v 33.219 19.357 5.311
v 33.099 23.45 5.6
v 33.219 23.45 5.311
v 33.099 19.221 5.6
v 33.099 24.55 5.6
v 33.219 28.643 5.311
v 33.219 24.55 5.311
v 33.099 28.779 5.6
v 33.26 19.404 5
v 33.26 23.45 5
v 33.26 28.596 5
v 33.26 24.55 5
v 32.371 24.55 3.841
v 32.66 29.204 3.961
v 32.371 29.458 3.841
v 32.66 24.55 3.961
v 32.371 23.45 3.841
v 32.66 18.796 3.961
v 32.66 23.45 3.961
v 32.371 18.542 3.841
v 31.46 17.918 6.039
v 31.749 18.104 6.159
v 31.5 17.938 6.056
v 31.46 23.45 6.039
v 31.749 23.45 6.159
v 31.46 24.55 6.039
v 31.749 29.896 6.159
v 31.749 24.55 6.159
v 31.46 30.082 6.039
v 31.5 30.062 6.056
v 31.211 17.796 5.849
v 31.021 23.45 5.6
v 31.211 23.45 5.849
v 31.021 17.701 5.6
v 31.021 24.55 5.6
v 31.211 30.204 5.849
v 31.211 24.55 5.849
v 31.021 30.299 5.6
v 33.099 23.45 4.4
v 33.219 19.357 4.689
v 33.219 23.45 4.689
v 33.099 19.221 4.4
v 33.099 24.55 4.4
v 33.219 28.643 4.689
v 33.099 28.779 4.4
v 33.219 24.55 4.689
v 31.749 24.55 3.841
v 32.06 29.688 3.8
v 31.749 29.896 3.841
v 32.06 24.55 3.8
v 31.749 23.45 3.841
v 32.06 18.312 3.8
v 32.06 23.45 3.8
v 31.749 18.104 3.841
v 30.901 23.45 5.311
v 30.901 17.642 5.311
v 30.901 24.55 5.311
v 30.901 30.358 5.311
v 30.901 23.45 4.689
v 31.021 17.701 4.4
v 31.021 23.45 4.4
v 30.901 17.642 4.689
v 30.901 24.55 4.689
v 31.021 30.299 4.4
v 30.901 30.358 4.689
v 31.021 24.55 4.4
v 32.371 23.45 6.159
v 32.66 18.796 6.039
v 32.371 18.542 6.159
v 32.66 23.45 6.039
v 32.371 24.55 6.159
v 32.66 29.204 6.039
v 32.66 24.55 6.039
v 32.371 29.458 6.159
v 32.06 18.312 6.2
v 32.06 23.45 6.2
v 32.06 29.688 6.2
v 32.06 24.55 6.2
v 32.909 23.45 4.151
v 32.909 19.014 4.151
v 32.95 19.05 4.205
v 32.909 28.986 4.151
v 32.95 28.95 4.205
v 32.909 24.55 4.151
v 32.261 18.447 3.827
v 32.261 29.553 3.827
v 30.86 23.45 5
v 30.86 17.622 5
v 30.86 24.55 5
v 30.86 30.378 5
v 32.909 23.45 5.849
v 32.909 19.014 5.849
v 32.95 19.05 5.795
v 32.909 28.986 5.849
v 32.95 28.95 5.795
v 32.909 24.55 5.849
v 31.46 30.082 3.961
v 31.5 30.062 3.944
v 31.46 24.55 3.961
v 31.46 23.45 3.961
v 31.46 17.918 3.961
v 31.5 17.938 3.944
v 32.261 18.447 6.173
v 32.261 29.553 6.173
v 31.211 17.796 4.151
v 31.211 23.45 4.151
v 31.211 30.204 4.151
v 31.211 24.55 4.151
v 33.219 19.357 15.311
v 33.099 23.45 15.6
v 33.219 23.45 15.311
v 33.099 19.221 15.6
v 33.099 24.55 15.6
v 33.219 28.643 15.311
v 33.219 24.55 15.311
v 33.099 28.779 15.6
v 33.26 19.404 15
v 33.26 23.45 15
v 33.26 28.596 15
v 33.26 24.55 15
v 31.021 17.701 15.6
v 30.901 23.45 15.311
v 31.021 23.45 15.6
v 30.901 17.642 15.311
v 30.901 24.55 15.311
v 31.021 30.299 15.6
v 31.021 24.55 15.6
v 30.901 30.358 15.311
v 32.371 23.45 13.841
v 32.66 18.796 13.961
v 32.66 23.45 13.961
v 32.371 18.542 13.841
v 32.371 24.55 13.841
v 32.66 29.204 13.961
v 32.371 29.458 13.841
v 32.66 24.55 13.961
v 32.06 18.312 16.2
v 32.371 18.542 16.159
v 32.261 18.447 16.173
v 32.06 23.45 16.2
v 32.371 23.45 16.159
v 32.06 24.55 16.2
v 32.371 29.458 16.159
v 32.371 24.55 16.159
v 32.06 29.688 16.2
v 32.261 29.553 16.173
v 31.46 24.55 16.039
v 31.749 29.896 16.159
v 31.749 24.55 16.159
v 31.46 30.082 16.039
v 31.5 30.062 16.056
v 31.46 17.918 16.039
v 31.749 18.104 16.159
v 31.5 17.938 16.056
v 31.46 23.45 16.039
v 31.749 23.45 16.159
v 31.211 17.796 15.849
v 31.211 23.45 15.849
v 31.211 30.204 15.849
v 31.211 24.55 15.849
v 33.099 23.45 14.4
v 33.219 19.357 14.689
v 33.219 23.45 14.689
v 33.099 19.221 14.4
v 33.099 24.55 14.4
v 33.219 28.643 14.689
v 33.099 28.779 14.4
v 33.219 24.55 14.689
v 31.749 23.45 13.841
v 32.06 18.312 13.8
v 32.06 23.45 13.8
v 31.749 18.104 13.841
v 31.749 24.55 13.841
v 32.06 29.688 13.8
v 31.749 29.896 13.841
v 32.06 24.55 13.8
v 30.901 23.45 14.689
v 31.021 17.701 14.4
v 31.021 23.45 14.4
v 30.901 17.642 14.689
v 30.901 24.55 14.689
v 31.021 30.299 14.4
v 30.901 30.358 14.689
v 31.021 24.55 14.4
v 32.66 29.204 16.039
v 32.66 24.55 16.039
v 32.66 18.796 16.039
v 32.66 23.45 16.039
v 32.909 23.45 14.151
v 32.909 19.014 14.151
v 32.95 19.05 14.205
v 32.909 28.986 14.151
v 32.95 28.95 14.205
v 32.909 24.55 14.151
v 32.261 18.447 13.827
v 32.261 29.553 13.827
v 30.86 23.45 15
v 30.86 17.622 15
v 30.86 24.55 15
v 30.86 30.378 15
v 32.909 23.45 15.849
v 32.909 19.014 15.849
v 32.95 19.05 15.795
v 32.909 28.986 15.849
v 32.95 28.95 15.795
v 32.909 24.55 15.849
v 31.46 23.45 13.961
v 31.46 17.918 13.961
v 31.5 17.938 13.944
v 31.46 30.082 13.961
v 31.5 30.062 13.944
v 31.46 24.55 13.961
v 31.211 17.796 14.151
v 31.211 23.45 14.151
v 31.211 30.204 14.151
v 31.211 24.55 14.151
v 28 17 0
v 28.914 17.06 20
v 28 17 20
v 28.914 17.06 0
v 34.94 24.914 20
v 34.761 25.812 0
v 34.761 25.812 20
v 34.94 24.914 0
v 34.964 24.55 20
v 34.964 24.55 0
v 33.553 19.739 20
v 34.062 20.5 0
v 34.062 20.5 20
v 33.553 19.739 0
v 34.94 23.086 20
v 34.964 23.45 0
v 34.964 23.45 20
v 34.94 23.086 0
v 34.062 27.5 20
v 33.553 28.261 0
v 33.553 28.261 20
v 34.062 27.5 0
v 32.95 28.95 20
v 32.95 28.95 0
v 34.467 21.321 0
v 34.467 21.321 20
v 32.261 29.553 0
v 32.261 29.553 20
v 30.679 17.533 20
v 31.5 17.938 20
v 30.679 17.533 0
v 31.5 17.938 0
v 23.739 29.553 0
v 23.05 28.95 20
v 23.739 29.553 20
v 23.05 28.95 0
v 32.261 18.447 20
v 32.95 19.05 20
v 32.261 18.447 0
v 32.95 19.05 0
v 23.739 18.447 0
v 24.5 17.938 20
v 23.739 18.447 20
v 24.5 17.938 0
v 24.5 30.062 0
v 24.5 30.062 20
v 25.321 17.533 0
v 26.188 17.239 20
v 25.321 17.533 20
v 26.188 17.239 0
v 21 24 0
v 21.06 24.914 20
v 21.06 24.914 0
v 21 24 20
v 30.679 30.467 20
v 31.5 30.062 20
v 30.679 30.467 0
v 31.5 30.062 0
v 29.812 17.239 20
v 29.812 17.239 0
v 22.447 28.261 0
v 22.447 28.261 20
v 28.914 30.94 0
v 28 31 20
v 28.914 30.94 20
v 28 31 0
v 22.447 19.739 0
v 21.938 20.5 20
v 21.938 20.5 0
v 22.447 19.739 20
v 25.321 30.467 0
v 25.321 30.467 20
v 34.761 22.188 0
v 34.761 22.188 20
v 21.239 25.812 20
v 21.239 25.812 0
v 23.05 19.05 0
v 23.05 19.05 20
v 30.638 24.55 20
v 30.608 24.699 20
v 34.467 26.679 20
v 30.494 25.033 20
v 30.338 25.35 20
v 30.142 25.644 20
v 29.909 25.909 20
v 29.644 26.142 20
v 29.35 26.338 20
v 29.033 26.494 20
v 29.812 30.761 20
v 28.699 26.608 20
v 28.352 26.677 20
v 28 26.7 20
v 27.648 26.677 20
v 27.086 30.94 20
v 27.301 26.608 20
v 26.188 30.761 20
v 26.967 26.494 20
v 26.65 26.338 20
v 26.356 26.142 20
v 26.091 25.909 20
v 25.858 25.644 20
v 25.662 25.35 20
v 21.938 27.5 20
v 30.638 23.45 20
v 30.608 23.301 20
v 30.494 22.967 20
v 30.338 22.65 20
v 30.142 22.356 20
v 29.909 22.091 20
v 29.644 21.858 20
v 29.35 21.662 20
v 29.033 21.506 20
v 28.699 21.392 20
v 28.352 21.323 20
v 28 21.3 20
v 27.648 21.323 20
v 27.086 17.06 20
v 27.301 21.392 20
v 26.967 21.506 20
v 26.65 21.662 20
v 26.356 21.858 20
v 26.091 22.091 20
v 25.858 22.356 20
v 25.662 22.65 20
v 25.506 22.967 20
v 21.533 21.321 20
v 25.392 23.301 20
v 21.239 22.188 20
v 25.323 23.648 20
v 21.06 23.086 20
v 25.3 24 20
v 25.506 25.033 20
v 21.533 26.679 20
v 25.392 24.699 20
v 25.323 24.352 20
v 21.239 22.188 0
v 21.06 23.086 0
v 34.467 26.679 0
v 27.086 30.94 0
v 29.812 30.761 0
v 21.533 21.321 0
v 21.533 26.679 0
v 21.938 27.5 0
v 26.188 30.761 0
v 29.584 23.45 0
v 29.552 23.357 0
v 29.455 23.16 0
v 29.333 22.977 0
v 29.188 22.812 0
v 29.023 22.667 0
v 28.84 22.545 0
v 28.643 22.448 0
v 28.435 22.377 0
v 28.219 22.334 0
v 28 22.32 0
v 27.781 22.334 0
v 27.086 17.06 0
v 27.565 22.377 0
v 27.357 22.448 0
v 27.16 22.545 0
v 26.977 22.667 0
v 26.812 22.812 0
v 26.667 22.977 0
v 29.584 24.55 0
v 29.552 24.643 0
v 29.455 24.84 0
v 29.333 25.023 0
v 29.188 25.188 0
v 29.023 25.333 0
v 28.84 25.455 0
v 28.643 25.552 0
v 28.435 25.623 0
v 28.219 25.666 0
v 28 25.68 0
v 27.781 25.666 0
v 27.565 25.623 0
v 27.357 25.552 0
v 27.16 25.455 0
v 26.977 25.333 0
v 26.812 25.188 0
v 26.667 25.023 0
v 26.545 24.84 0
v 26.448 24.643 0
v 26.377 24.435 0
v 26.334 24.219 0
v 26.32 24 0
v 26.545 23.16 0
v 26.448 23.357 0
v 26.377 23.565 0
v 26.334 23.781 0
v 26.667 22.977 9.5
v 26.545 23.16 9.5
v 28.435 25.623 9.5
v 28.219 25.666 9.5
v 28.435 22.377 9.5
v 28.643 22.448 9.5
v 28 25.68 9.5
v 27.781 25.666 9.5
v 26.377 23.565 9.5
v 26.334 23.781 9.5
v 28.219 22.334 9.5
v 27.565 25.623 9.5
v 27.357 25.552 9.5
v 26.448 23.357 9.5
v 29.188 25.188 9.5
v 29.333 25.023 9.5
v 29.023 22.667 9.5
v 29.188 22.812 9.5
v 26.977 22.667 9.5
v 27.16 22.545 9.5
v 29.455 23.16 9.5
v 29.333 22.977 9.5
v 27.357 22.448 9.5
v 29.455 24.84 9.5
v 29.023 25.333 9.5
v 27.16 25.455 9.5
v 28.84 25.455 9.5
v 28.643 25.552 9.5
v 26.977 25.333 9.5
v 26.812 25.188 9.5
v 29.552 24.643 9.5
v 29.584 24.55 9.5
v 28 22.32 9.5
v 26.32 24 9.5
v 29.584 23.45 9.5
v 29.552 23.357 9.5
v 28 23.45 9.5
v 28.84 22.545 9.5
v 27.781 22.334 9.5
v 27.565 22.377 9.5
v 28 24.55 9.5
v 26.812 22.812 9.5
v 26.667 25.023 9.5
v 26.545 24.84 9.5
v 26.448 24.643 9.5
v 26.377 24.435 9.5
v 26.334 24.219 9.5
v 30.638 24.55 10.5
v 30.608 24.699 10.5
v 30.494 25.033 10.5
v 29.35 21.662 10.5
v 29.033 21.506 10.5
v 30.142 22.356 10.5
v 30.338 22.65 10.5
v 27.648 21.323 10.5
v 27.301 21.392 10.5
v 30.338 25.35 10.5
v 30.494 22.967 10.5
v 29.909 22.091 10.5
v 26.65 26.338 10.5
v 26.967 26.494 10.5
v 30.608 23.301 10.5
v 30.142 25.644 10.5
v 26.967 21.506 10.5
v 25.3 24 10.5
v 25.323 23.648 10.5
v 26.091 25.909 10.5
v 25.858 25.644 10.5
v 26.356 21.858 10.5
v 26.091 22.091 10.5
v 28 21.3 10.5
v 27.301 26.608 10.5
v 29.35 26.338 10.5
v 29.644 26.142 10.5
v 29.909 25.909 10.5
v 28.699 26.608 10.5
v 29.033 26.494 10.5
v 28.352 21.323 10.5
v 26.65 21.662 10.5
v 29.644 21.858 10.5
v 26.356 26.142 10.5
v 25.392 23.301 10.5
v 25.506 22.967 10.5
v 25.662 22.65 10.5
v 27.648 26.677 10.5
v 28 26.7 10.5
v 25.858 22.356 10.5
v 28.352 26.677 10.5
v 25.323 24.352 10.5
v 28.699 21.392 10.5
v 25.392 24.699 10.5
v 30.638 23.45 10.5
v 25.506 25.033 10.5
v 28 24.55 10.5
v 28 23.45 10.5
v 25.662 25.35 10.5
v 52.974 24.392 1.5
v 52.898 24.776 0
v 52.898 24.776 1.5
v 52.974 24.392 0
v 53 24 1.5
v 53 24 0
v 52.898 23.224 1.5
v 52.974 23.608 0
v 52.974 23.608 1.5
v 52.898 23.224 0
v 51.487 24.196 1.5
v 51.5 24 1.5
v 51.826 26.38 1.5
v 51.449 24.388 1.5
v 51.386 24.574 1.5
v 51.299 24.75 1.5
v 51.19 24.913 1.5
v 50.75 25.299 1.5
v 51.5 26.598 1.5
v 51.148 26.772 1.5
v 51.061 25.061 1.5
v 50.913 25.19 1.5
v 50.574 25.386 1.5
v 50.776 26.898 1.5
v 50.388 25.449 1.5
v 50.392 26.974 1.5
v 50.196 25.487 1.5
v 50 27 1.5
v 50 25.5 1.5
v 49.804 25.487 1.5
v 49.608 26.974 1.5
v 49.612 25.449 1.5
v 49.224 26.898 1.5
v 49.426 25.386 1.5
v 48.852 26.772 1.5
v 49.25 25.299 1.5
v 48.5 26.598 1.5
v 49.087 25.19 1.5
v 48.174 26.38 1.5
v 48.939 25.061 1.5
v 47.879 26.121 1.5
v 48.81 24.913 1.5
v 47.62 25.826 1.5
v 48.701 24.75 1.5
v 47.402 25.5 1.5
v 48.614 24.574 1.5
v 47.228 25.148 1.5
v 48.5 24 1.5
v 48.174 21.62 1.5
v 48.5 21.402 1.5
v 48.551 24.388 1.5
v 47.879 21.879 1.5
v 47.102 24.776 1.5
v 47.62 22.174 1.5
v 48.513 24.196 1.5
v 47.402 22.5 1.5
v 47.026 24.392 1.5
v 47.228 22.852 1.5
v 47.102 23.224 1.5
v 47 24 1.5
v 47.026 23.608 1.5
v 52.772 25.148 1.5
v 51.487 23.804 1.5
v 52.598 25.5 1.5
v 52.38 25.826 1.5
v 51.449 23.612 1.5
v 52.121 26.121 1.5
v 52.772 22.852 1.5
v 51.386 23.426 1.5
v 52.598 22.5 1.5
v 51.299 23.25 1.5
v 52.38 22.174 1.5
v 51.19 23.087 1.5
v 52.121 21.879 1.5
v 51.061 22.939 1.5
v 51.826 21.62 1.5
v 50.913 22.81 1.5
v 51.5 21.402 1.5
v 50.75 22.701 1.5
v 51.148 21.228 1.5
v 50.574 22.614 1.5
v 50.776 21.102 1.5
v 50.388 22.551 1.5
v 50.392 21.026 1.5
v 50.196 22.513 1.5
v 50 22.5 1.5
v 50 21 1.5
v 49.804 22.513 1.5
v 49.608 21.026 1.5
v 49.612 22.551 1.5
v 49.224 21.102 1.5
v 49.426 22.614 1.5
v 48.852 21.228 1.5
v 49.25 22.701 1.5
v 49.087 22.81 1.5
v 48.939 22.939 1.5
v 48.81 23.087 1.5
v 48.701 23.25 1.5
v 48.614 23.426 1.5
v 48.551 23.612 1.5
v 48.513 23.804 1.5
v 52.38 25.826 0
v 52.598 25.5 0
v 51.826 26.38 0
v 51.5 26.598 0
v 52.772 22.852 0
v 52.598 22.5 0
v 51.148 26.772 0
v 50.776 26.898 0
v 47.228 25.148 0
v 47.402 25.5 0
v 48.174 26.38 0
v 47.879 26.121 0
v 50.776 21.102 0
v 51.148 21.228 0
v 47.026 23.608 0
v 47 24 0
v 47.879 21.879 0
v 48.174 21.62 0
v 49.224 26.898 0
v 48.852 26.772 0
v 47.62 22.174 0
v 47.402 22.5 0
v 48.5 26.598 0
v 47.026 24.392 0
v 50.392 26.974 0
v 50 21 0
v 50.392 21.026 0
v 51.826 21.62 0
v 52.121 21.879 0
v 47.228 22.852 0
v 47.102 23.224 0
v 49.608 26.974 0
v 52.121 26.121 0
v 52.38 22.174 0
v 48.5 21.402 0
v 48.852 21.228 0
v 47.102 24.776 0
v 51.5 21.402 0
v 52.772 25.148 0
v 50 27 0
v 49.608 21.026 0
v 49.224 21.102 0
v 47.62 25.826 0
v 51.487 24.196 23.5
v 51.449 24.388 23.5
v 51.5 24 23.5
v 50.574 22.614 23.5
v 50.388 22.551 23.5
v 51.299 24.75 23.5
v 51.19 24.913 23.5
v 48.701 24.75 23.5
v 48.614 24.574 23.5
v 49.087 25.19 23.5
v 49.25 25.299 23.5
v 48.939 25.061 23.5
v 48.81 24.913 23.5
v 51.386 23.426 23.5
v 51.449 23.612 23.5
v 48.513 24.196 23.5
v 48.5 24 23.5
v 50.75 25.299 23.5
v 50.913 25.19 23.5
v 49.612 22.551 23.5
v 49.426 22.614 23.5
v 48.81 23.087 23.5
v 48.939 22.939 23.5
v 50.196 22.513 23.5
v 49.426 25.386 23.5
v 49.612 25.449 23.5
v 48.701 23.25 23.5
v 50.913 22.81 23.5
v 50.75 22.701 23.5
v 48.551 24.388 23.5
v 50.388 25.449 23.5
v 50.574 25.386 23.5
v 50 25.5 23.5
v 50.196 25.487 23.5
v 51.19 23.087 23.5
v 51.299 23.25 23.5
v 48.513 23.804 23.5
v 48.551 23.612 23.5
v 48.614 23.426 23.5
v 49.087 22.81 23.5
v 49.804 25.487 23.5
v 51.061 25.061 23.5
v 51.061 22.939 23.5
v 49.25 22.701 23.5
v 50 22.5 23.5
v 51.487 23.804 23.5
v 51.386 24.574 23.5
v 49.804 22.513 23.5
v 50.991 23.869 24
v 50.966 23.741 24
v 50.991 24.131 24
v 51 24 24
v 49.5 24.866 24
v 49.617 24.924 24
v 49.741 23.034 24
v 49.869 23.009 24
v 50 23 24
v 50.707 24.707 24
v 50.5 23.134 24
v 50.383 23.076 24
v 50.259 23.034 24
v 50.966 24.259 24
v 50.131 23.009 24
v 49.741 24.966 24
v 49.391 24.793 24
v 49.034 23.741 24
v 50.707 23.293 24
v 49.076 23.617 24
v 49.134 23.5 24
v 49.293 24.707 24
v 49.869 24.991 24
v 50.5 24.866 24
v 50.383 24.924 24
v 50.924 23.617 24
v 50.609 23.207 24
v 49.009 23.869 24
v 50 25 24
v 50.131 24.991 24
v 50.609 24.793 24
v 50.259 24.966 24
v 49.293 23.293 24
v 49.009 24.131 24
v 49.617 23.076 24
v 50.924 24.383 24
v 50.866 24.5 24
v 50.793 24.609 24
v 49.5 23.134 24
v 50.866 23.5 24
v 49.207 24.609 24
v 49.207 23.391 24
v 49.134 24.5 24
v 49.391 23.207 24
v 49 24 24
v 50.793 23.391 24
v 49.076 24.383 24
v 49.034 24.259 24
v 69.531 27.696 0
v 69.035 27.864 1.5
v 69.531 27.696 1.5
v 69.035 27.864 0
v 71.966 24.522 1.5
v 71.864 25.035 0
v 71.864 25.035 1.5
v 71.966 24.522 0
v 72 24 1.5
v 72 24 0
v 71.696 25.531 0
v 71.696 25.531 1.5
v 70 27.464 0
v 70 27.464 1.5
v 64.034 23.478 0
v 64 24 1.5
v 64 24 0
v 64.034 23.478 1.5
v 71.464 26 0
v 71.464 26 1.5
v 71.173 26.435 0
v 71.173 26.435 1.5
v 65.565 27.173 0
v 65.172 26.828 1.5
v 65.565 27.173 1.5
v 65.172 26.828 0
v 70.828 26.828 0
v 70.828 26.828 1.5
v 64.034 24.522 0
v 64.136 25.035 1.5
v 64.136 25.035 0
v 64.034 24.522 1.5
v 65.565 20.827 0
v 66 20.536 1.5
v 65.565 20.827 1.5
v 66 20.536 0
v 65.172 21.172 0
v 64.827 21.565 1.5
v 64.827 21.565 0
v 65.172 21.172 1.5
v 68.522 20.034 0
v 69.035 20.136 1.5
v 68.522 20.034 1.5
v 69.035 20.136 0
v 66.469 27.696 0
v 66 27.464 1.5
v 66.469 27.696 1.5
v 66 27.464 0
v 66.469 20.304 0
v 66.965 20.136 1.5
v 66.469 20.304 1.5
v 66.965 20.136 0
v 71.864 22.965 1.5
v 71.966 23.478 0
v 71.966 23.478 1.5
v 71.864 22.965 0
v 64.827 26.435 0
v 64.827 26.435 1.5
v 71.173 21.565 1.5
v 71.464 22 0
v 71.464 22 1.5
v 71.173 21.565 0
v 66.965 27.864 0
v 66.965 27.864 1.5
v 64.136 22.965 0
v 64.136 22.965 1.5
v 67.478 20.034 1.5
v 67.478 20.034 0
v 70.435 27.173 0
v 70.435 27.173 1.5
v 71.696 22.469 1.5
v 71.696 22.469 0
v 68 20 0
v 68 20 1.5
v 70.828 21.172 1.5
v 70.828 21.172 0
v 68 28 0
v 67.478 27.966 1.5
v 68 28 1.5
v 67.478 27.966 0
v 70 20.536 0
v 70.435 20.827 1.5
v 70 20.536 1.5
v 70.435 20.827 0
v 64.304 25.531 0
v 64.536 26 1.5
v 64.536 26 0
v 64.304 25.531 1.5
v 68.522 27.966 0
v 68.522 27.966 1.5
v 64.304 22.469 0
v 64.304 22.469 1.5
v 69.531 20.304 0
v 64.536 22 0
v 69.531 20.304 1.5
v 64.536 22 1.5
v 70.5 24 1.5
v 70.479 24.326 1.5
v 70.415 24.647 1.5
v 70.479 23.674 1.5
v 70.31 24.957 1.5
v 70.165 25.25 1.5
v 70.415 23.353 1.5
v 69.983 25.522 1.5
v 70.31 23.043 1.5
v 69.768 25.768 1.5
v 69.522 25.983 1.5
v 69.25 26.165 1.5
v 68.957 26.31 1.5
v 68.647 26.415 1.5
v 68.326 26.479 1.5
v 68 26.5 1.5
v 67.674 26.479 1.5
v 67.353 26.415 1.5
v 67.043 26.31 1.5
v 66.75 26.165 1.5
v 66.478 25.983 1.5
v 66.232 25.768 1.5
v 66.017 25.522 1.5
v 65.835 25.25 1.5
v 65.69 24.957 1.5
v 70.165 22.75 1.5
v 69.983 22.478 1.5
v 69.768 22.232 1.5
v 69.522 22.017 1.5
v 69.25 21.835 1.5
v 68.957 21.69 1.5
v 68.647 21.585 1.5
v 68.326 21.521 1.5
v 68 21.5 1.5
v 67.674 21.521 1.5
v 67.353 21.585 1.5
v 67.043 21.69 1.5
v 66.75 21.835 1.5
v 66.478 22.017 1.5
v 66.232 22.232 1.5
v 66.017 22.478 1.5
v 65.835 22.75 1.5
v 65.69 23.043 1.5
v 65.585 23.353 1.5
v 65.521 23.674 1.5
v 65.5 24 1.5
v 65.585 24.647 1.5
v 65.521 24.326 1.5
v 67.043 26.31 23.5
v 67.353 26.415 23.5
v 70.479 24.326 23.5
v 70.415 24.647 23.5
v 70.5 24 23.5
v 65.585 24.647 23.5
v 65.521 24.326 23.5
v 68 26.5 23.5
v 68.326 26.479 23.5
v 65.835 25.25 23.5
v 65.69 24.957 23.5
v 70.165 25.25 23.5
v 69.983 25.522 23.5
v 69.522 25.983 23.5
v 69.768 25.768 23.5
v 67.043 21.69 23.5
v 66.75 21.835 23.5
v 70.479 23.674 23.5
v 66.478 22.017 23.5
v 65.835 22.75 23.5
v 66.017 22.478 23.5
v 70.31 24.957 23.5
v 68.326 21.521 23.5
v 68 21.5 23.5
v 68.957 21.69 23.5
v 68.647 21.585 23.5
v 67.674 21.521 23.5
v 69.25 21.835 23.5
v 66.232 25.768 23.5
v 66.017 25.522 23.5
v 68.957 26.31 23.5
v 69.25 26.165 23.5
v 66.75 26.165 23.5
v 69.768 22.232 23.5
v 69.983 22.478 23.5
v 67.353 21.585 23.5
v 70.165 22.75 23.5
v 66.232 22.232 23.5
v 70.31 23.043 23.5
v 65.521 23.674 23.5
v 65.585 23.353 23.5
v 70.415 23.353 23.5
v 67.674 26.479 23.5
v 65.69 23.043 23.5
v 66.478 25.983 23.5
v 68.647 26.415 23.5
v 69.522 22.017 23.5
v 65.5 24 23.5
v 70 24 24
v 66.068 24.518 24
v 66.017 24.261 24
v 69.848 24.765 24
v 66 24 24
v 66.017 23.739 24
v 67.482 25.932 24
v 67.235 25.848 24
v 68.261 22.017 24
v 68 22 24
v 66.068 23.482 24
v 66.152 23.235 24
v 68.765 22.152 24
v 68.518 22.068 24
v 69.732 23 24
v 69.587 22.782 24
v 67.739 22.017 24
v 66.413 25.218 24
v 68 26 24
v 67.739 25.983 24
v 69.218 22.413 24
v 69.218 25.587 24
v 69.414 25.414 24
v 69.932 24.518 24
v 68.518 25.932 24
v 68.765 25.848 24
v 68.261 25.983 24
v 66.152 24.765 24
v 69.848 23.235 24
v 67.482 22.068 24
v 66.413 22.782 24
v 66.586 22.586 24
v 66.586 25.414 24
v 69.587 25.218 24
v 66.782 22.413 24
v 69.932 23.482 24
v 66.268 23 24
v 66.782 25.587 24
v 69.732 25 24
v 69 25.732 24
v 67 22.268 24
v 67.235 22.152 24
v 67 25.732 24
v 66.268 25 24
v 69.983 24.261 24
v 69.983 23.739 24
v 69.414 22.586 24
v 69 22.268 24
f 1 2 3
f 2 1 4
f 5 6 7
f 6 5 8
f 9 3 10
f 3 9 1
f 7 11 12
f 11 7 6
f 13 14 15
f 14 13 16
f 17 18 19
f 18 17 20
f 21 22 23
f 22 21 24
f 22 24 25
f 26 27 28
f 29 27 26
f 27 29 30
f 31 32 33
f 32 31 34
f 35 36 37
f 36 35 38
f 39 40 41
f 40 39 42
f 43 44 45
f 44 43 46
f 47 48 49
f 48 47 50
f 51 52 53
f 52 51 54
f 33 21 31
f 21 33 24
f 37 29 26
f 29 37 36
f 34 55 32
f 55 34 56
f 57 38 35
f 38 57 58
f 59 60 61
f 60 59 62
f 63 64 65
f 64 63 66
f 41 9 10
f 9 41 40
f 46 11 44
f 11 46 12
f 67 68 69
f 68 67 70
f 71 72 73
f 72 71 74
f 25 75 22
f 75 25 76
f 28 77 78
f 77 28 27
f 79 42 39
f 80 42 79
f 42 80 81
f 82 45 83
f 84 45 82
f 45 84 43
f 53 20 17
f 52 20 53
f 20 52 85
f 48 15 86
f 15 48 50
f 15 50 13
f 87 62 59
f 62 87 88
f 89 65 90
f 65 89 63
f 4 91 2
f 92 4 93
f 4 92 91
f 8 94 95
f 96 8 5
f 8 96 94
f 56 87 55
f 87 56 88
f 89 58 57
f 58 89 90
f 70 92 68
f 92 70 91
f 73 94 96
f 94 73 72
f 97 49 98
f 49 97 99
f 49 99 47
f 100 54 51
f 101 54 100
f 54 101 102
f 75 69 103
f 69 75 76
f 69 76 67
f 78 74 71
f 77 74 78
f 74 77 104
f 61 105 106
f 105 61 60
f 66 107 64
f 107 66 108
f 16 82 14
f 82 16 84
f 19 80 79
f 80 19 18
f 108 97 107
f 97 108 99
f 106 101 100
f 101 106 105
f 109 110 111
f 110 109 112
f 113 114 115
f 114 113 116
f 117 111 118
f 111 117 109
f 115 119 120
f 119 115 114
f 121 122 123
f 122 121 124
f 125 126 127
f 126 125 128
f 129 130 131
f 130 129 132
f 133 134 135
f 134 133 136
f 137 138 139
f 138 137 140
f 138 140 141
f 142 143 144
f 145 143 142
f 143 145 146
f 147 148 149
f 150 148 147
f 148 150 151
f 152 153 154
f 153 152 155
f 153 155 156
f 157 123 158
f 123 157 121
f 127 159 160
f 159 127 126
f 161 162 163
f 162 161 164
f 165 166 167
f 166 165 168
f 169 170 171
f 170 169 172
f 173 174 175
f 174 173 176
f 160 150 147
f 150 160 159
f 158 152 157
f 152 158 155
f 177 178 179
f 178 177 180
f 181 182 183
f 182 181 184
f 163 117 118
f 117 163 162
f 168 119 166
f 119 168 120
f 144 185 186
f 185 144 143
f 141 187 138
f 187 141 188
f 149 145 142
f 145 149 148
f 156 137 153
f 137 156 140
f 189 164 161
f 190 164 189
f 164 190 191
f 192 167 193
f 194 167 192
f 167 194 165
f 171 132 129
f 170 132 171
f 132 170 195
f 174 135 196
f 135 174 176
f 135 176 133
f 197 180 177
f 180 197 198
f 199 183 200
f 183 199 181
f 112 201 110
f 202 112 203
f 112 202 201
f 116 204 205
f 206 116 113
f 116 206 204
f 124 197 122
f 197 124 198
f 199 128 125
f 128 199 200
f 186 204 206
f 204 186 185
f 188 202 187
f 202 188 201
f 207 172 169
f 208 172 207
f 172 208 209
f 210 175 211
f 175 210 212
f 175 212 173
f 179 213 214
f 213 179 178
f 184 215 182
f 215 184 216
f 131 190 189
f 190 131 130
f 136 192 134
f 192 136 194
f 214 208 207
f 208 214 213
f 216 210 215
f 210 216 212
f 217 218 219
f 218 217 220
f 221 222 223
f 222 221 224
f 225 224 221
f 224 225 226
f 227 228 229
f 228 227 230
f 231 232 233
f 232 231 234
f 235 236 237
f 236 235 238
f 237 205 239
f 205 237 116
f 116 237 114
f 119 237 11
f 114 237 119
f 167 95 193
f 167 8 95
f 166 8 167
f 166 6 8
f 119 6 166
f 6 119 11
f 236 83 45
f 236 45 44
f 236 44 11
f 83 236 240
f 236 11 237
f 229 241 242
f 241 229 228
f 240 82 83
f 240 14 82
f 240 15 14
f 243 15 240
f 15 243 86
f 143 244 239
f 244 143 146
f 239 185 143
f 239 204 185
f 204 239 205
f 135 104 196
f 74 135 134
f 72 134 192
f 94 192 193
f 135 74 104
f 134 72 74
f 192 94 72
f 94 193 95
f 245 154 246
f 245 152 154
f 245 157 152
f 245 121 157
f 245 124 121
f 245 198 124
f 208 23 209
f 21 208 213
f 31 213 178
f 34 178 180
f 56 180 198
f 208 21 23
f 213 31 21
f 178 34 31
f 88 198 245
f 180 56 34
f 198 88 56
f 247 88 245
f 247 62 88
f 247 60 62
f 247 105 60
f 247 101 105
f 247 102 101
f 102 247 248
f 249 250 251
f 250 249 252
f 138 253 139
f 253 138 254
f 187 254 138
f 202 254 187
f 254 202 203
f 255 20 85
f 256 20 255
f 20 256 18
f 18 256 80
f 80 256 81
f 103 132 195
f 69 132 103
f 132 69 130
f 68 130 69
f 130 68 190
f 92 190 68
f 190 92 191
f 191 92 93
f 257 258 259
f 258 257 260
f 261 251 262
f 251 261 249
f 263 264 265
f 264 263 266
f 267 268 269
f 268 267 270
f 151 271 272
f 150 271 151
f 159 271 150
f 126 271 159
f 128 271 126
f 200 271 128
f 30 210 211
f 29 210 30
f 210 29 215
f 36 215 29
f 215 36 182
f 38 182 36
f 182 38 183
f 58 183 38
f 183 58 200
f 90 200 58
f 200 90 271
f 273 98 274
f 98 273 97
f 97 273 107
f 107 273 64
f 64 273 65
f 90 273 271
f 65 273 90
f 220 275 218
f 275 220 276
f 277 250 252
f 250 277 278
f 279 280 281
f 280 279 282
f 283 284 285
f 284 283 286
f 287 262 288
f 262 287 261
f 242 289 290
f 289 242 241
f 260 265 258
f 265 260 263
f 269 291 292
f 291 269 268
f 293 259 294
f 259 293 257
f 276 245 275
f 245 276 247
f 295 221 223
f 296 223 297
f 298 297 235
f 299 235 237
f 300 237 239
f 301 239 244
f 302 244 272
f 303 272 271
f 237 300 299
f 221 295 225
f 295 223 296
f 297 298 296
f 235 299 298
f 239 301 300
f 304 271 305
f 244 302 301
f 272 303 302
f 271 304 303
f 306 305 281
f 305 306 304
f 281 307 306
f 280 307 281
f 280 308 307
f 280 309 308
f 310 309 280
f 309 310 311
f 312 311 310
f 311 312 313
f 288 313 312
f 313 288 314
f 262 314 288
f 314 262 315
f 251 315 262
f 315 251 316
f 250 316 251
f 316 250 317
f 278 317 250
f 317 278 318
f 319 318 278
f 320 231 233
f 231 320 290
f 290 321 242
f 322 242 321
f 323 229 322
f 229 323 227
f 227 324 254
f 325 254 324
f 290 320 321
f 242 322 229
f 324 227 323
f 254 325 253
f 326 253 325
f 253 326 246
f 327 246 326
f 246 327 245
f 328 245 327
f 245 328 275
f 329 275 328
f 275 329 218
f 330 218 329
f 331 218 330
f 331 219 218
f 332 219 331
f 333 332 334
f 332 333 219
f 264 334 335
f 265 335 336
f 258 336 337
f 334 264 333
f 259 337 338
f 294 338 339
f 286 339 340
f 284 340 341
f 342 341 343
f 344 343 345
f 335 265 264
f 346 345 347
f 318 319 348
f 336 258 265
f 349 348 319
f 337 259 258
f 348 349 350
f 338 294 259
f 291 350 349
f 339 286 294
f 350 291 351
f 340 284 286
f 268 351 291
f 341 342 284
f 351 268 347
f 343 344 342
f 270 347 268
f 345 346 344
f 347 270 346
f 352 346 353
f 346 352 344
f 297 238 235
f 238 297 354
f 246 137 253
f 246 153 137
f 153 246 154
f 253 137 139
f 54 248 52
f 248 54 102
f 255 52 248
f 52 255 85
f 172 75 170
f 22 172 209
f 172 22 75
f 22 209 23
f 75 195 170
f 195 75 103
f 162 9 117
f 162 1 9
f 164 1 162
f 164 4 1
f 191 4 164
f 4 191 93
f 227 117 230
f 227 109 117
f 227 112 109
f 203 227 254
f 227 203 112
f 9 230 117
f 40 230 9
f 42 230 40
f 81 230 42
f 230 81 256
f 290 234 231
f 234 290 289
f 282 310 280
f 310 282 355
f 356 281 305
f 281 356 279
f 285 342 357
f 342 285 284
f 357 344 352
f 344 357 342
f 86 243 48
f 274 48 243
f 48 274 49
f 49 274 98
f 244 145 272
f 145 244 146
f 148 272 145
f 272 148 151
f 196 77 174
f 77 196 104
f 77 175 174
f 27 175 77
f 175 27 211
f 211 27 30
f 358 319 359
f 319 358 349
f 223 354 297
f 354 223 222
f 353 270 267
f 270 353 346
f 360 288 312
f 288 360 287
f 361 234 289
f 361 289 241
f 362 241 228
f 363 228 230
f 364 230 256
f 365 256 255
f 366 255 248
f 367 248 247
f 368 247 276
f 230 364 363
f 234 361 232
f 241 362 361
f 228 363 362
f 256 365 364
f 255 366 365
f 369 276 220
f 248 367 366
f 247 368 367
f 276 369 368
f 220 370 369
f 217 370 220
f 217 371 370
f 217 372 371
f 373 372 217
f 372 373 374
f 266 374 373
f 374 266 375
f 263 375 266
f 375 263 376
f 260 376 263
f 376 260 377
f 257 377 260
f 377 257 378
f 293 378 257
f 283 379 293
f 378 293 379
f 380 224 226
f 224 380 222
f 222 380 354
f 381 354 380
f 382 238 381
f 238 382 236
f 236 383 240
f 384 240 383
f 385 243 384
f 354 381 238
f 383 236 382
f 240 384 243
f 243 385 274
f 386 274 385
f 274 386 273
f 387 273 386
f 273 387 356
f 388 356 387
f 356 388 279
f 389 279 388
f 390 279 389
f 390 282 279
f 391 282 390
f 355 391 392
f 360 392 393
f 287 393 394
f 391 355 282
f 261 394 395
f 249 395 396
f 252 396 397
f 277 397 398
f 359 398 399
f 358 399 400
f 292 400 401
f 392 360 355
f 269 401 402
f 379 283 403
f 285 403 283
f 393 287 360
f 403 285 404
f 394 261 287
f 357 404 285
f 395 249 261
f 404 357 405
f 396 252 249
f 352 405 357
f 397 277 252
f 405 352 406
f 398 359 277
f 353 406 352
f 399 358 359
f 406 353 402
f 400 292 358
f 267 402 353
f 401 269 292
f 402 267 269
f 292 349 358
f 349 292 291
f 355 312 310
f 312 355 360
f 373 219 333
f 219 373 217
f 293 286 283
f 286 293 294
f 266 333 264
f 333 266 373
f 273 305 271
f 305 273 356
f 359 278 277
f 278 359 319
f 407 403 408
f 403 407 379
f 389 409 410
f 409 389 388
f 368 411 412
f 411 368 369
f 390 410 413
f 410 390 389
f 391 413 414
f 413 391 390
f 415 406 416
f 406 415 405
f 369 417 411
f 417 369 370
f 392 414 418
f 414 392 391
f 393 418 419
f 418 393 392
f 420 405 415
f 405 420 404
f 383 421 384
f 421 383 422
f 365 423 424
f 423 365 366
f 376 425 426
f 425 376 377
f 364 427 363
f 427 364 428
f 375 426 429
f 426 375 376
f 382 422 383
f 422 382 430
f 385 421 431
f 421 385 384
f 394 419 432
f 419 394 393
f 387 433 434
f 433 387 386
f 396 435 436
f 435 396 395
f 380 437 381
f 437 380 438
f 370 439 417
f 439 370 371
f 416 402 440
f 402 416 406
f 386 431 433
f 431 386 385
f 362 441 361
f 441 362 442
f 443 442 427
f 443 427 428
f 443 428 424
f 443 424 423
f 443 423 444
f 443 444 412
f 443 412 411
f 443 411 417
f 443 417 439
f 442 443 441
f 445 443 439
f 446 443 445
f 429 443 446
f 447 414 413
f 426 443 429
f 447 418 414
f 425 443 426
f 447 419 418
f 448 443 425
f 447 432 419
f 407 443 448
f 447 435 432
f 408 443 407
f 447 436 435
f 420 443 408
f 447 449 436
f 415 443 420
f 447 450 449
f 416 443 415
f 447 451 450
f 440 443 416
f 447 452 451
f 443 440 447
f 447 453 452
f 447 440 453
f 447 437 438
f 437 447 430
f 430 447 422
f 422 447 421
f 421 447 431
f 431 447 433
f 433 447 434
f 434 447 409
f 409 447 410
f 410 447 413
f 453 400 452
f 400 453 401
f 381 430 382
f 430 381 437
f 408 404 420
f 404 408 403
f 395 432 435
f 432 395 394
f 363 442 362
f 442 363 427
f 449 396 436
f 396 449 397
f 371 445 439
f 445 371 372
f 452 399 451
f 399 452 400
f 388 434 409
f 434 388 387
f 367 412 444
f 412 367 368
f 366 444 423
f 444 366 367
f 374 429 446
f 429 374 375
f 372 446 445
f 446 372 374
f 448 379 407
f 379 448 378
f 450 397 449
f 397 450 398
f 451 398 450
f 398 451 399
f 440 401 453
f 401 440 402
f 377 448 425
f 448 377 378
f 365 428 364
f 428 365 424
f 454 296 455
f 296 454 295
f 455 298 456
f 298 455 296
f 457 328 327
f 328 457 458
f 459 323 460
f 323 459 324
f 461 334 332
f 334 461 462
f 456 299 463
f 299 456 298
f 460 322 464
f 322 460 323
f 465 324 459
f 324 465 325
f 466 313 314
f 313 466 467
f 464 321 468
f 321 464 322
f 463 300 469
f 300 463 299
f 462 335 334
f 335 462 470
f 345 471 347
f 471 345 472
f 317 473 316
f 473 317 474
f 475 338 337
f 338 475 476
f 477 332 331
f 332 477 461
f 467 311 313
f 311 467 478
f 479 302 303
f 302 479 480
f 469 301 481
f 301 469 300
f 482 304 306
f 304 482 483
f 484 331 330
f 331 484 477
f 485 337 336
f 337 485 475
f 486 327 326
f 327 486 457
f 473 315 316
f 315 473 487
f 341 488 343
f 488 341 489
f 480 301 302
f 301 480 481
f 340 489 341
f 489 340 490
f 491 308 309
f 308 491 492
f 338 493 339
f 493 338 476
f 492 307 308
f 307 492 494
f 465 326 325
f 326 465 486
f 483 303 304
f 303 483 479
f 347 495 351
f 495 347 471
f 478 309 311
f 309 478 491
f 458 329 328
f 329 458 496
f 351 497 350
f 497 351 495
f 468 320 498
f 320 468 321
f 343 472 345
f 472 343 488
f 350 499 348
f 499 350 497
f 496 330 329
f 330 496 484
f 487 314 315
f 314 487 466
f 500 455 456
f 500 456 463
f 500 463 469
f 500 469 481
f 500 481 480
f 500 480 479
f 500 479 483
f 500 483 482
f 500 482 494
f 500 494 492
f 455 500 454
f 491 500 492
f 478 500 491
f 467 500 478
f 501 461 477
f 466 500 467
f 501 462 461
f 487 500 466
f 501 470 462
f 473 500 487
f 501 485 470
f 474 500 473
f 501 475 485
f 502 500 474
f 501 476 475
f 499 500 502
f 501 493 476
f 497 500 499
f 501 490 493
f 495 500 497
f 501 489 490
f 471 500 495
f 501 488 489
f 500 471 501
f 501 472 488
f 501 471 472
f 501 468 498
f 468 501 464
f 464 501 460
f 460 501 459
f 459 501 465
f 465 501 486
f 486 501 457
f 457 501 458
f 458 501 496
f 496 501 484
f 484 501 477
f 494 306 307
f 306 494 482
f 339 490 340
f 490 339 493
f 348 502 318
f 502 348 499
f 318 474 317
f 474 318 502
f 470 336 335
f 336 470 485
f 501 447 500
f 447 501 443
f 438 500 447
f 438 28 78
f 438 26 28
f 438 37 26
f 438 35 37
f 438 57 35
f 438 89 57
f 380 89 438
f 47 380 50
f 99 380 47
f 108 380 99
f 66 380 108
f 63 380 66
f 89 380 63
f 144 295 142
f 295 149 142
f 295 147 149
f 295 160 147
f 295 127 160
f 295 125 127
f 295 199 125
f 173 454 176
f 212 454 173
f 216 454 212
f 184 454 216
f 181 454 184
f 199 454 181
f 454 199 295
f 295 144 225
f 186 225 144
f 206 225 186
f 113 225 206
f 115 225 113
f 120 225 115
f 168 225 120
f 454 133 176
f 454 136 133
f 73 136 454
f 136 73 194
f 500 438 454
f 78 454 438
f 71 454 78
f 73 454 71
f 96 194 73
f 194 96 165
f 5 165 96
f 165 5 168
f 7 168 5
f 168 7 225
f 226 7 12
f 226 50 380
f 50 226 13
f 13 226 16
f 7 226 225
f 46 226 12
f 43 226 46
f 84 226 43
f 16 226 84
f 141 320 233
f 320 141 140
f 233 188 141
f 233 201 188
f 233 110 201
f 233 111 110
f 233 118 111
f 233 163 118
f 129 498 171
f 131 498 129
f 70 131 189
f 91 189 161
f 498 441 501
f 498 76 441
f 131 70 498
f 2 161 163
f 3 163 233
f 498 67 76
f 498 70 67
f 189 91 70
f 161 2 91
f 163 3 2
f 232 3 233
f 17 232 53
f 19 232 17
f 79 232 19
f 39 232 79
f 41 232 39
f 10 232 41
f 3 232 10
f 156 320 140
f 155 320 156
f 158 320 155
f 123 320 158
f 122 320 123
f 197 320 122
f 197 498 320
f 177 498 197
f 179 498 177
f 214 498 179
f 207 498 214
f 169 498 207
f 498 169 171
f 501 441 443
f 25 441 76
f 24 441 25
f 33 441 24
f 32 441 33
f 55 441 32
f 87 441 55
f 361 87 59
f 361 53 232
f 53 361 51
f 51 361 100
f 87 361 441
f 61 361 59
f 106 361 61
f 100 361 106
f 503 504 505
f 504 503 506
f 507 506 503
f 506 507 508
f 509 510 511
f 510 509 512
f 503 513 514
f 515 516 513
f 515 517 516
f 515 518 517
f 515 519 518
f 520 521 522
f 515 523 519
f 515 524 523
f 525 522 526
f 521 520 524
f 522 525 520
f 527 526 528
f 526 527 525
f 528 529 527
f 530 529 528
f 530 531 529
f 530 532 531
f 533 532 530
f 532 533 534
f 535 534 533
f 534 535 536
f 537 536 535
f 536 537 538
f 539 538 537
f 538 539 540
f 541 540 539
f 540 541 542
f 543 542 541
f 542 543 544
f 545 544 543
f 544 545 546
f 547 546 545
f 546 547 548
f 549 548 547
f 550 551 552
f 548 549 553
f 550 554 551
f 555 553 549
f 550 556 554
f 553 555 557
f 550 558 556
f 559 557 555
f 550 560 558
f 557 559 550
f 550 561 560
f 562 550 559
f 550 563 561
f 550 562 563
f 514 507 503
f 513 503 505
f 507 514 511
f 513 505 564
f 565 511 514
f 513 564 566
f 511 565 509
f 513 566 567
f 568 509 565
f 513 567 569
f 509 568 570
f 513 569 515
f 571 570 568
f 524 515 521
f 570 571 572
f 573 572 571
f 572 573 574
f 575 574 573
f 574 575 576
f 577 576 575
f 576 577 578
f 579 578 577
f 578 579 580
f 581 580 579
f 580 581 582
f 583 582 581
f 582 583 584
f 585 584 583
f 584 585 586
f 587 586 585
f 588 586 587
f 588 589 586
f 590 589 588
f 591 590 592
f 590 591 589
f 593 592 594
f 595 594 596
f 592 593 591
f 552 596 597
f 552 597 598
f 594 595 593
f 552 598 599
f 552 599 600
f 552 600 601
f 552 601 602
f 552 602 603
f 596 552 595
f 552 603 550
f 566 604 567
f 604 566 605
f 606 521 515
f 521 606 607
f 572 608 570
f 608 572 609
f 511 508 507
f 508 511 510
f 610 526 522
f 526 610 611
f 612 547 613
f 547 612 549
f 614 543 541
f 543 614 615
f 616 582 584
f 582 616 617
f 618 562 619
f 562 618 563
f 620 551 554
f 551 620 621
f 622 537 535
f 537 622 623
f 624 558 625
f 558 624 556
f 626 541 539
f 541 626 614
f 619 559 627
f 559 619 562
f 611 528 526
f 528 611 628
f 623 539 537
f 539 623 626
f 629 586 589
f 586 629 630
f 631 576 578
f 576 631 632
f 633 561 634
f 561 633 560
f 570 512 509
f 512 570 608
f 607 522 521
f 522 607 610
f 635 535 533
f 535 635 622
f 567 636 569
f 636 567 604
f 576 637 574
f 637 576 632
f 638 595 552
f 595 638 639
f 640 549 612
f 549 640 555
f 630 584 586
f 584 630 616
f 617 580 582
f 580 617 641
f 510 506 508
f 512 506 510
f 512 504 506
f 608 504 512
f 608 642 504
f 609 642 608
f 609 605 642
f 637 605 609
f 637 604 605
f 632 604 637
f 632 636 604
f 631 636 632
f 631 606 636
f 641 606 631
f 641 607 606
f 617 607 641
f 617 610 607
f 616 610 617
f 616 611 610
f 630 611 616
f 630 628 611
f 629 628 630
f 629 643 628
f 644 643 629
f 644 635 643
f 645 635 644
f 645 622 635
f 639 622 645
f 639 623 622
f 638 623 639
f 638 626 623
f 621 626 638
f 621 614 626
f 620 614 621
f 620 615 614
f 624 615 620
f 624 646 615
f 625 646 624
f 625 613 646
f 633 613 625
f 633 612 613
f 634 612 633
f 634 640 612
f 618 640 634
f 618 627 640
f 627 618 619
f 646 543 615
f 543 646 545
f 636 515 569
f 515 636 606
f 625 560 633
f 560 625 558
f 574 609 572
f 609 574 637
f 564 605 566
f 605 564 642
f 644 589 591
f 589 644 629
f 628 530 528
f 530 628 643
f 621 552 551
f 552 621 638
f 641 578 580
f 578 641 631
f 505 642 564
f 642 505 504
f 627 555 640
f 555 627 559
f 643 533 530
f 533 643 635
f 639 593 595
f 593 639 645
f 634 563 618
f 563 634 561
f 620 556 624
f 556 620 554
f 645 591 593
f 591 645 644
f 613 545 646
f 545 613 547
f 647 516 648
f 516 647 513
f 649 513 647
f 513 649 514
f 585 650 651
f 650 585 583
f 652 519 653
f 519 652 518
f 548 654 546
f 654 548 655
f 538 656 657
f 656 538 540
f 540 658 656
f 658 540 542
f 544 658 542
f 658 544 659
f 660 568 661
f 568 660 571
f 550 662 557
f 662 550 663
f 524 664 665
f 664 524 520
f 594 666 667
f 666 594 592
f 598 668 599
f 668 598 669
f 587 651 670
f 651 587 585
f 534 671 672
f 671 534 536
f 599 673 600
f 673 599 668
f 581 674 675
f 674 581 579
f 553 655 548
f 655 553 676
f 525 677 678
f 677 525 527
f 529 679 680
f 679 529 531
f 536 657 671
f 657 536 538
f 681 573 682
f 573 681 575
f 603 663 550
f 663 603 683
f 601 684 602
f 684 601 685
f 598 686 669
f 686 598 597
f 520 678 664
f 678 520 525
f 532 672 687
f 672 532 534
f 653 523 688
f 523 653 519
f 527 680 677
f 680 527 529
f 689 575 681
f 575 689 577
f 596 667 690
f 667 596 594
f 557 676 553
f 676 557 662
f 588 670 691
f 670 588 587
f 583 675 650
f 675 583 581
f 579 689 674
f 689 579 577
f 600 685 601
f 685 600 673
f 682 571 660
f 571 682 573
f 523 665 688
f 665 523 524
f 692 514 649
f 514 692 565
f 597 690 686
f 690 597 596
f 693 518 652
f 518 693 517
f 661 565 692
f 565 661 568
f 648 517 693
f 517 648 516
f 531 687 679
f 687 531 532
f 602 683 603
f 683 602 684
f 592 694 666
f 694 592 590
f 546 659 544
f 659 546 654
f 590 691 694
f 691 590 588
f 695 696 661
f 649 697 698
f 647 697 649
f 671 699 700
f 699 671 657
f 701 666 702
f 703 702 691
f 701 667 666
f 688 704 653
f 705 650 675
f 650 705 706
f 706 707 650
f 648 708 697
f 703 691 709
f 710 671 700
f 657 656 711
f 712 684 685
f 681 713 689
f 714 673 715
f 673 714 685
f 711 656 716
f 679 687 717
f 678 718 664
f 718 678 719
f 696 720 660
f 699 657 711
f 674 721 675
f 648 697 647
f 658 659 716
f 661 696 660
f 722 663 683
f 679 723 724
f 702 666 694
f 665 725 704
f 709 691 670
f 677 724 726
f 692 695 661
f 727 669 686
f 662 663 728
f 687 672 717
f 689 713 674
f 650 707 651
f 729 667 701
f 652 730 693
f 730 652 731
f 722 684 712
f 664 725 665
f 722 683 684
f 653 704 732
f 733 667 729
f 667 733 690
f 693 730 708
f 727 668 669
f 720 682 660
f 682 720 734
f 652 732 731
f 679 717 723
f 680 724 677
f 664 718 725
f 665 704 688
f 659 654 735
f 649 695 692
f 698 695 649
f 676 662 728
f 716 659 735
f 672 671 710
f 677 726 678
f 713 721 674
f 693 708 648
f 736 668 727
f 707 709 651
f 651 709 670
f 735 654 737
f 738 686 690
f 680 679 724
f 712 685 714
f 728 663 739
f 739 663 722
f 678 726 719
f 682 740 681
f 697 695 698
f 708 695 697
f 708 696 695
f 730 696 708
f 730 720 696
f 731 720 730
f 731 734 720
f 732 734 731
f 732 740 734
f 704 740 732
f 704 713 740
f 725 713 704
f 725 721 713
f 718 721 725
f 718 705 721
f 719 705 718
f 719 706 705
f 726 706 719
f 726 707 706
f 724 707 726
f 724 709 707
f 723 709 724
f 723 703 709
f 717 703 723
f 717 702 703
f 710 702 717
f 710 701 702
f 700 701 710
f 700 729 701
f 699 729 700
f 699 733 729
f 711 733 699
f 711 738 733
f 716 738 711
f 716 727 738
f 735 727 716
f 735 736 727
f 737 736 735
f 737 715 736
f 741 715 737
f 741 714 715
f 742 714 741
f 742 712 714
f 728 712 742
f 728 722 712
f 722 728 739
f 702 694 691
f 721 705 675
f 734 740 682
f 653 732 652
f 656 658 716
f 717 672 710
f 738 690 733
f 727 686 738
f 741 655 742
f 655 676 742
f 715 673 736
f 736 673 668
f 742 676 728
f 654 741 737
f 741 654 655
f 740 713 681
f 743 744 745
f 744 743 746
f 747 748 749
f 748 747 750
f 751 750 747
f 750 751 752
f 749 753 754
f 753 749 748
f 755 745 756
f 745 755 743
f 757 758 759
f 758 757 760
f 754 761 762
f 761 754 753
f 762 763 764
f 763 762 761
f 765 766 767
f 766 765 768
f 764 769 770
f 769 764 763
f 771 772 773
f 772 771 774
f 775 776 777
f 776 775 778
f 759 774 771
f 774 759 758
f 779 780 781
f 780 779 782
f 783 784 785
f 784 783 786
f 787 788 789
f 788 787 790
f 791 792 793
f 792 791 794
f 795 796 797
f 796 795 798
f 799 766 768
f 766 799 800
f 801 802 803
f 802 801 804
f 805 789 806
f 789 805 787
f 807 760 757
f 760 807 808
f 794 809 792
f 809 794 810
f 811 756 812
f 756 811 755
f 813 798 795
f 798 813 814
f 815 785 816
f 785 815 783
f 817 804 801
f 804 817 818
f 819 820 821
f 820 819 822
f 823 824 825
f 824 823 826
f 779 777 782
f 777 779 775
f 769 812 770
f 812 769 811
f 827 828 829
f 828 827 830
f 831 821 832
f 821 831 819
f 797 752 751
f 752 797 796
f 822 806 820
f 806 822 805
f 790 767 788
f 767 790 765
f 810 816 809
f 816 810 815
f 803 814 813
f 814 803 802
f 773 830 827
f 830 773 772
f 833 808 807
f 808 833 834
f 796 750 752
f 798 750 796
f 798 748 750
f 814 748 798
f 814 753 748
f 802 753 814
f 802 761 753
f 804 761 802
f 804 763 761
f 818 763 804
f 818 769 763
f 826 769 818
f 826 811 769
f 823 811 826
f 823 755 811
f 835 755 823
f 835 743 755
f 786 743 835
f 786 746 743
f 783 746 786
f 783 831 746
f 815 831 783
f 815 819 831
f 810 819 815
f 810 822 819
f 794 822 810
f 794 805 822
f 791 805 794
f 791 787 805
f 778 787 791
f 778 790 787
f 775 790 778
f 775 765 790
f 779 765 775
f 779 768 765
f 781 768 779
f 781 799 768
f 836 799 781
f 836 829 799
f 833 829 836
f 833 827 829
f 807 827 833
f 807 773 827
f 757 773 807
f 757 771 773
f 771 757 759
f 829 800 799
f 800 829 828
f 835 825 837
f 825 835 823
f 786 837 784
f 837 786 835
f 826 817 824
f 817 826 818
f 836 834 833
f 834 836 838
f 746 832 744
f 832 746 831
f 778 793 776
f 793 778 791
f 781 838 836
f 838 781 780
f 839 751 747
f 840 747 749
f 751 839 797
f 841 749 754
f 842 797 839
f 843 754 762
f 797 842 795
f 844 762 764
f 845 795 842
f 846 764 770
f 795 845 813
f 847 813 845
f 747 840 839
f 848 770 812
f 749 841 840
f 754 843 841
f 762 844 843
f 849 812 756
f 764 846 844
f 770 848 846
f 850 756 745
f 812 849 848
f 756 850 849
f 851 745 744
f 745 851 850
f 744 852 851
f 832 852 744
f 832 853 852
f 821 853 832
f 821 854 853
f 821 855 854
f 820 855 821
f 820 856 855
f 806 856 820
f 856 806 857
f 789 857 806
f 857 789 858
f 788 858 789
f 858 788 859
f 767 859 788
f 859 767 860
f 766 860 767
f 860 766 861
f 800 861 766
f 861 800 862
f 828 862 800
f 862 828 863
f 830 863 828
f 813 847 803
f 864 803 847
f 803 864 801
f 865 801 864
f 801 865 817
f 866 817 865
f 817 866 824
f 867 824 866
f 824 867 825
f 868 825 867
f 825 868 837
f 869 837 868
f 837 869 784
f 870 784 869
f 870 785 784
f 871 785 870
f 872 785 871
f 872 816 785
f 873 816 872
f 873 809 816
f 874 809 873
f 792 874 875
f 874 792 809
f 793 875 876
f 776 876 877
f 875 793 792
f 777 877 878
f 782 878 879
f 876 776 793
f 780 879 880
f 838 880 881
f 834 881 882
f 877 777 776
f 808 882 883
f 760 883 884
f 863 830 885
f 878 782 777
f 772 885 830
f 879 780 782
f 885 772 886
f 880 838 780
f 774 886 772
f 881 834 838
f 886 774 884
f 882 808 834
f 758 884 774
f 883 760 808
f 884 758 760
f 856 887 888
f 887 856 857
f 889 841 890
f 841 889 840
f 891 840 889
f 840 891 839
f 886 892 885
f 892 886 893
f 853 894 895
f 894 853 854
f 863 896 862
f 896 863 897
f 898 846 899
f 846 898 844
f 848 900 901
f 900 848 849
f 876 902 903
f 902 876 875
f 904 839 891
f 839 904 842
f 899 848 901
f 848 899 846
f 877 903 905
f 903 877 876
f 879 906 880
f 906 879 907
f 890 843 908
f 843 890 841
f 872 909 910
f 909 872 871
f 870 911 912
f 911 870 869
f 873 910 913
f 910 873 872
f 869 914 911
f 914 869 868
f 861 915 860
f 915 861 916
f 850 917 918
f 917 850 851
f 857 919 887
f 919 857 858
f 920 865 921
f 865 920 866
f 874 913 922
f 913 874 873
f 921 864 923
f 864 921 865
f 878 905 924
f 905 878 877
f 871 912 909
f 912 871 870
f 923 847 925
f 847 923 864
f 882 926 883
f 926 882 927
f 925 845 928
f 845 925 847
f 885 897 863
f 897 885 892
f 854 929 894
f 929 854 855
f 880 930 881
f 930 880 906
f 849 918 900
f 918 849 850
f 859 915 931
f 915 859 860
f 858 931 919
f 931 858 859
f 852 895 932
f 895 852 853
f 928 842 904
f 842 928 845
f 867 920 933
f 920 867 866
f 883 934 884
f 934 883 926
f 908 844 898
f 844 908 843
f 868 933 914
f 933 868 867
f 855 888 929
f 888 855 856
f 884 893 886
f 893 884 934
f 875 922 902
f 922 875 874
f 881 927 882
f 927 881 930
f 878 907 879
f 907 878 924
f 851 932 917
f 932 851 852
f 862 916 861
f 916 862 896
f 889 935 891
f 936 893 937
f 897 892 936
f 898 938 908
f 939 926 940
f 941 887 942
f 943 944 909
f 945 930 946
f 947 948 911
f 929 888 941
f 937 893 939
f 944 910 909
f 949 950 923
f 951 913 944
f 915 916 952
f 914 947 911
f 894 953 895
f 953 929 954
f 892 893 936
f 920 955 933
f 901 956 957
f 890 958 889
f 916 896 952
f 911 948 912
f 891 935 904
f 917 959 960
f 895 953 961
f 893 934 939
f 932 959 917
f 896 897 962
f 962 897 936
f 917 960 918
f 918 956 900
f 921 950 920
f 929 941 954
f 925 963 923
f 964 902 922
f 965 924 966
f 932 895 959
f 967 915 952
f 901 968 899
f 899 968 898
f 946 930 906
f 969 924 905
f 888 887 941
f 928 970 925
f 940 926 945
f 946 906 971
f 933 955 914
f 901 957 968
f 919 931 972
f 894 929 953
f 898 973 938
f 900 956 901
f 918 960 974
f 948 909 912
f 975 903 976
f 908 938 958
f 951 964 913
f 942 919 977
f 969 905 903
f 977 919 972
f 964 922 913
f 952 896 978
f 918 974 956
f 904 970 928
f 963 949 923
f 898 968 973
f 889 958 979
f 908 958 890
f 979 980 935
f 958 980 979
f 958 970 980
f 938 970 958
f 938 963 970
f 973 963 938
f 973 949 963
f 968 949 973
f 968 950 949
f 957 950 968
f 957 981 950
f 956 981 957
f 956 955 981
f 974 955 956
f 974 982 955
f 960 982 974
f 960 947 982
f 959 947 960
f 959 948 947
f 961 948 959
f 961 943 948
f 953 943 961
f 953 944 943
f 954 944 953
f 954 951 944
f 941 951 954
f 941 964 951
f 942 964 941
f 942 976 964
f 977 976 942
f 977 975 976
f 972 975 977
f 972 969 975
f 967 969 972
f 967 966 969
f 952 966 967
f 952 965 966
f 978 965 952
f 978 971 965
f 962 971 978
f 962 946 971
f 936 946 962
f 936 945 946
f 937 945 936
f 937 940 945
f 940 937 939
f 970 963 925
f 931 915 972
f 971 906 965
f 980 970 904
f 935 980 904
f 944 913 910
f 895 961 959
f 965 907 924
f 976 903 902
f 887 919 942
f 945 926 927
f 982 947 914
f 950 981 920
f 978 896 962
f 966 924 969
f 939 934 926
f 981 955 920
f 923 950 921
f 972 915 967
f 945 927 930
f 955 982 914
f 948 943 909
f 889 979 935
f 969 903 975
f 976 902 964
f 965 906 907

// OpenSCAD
/*
Sample 132: Kompakte asymmetrische Wellenkupplung — 3 auf 5 mm
Generated from the FDM Mechanical Sample Library.
Units: millimetres.

Override examples:
  openscad -o custom.stl -D 'view="plate"' -D 'render_fn=64' model.scad
  openscad -o preview.png -D 'view="assembly"' model.scad
*/
use <../../../library/fdm_mechanisms.scad>

render_fn = is_undef(render_fn) ? 48 : render_fn;
view = is_undef(view) ? "plate" : view;
$fn = render_fn;

sample_micro_shaft_coupler(
    view=view,
    input_d=3,
    output_d=5,
    input_clearance=0.18,
    output_clearance=0.2,
    length=20,
    outer_d=14,
    fastener=2.4,
    axial_stop=1
);
